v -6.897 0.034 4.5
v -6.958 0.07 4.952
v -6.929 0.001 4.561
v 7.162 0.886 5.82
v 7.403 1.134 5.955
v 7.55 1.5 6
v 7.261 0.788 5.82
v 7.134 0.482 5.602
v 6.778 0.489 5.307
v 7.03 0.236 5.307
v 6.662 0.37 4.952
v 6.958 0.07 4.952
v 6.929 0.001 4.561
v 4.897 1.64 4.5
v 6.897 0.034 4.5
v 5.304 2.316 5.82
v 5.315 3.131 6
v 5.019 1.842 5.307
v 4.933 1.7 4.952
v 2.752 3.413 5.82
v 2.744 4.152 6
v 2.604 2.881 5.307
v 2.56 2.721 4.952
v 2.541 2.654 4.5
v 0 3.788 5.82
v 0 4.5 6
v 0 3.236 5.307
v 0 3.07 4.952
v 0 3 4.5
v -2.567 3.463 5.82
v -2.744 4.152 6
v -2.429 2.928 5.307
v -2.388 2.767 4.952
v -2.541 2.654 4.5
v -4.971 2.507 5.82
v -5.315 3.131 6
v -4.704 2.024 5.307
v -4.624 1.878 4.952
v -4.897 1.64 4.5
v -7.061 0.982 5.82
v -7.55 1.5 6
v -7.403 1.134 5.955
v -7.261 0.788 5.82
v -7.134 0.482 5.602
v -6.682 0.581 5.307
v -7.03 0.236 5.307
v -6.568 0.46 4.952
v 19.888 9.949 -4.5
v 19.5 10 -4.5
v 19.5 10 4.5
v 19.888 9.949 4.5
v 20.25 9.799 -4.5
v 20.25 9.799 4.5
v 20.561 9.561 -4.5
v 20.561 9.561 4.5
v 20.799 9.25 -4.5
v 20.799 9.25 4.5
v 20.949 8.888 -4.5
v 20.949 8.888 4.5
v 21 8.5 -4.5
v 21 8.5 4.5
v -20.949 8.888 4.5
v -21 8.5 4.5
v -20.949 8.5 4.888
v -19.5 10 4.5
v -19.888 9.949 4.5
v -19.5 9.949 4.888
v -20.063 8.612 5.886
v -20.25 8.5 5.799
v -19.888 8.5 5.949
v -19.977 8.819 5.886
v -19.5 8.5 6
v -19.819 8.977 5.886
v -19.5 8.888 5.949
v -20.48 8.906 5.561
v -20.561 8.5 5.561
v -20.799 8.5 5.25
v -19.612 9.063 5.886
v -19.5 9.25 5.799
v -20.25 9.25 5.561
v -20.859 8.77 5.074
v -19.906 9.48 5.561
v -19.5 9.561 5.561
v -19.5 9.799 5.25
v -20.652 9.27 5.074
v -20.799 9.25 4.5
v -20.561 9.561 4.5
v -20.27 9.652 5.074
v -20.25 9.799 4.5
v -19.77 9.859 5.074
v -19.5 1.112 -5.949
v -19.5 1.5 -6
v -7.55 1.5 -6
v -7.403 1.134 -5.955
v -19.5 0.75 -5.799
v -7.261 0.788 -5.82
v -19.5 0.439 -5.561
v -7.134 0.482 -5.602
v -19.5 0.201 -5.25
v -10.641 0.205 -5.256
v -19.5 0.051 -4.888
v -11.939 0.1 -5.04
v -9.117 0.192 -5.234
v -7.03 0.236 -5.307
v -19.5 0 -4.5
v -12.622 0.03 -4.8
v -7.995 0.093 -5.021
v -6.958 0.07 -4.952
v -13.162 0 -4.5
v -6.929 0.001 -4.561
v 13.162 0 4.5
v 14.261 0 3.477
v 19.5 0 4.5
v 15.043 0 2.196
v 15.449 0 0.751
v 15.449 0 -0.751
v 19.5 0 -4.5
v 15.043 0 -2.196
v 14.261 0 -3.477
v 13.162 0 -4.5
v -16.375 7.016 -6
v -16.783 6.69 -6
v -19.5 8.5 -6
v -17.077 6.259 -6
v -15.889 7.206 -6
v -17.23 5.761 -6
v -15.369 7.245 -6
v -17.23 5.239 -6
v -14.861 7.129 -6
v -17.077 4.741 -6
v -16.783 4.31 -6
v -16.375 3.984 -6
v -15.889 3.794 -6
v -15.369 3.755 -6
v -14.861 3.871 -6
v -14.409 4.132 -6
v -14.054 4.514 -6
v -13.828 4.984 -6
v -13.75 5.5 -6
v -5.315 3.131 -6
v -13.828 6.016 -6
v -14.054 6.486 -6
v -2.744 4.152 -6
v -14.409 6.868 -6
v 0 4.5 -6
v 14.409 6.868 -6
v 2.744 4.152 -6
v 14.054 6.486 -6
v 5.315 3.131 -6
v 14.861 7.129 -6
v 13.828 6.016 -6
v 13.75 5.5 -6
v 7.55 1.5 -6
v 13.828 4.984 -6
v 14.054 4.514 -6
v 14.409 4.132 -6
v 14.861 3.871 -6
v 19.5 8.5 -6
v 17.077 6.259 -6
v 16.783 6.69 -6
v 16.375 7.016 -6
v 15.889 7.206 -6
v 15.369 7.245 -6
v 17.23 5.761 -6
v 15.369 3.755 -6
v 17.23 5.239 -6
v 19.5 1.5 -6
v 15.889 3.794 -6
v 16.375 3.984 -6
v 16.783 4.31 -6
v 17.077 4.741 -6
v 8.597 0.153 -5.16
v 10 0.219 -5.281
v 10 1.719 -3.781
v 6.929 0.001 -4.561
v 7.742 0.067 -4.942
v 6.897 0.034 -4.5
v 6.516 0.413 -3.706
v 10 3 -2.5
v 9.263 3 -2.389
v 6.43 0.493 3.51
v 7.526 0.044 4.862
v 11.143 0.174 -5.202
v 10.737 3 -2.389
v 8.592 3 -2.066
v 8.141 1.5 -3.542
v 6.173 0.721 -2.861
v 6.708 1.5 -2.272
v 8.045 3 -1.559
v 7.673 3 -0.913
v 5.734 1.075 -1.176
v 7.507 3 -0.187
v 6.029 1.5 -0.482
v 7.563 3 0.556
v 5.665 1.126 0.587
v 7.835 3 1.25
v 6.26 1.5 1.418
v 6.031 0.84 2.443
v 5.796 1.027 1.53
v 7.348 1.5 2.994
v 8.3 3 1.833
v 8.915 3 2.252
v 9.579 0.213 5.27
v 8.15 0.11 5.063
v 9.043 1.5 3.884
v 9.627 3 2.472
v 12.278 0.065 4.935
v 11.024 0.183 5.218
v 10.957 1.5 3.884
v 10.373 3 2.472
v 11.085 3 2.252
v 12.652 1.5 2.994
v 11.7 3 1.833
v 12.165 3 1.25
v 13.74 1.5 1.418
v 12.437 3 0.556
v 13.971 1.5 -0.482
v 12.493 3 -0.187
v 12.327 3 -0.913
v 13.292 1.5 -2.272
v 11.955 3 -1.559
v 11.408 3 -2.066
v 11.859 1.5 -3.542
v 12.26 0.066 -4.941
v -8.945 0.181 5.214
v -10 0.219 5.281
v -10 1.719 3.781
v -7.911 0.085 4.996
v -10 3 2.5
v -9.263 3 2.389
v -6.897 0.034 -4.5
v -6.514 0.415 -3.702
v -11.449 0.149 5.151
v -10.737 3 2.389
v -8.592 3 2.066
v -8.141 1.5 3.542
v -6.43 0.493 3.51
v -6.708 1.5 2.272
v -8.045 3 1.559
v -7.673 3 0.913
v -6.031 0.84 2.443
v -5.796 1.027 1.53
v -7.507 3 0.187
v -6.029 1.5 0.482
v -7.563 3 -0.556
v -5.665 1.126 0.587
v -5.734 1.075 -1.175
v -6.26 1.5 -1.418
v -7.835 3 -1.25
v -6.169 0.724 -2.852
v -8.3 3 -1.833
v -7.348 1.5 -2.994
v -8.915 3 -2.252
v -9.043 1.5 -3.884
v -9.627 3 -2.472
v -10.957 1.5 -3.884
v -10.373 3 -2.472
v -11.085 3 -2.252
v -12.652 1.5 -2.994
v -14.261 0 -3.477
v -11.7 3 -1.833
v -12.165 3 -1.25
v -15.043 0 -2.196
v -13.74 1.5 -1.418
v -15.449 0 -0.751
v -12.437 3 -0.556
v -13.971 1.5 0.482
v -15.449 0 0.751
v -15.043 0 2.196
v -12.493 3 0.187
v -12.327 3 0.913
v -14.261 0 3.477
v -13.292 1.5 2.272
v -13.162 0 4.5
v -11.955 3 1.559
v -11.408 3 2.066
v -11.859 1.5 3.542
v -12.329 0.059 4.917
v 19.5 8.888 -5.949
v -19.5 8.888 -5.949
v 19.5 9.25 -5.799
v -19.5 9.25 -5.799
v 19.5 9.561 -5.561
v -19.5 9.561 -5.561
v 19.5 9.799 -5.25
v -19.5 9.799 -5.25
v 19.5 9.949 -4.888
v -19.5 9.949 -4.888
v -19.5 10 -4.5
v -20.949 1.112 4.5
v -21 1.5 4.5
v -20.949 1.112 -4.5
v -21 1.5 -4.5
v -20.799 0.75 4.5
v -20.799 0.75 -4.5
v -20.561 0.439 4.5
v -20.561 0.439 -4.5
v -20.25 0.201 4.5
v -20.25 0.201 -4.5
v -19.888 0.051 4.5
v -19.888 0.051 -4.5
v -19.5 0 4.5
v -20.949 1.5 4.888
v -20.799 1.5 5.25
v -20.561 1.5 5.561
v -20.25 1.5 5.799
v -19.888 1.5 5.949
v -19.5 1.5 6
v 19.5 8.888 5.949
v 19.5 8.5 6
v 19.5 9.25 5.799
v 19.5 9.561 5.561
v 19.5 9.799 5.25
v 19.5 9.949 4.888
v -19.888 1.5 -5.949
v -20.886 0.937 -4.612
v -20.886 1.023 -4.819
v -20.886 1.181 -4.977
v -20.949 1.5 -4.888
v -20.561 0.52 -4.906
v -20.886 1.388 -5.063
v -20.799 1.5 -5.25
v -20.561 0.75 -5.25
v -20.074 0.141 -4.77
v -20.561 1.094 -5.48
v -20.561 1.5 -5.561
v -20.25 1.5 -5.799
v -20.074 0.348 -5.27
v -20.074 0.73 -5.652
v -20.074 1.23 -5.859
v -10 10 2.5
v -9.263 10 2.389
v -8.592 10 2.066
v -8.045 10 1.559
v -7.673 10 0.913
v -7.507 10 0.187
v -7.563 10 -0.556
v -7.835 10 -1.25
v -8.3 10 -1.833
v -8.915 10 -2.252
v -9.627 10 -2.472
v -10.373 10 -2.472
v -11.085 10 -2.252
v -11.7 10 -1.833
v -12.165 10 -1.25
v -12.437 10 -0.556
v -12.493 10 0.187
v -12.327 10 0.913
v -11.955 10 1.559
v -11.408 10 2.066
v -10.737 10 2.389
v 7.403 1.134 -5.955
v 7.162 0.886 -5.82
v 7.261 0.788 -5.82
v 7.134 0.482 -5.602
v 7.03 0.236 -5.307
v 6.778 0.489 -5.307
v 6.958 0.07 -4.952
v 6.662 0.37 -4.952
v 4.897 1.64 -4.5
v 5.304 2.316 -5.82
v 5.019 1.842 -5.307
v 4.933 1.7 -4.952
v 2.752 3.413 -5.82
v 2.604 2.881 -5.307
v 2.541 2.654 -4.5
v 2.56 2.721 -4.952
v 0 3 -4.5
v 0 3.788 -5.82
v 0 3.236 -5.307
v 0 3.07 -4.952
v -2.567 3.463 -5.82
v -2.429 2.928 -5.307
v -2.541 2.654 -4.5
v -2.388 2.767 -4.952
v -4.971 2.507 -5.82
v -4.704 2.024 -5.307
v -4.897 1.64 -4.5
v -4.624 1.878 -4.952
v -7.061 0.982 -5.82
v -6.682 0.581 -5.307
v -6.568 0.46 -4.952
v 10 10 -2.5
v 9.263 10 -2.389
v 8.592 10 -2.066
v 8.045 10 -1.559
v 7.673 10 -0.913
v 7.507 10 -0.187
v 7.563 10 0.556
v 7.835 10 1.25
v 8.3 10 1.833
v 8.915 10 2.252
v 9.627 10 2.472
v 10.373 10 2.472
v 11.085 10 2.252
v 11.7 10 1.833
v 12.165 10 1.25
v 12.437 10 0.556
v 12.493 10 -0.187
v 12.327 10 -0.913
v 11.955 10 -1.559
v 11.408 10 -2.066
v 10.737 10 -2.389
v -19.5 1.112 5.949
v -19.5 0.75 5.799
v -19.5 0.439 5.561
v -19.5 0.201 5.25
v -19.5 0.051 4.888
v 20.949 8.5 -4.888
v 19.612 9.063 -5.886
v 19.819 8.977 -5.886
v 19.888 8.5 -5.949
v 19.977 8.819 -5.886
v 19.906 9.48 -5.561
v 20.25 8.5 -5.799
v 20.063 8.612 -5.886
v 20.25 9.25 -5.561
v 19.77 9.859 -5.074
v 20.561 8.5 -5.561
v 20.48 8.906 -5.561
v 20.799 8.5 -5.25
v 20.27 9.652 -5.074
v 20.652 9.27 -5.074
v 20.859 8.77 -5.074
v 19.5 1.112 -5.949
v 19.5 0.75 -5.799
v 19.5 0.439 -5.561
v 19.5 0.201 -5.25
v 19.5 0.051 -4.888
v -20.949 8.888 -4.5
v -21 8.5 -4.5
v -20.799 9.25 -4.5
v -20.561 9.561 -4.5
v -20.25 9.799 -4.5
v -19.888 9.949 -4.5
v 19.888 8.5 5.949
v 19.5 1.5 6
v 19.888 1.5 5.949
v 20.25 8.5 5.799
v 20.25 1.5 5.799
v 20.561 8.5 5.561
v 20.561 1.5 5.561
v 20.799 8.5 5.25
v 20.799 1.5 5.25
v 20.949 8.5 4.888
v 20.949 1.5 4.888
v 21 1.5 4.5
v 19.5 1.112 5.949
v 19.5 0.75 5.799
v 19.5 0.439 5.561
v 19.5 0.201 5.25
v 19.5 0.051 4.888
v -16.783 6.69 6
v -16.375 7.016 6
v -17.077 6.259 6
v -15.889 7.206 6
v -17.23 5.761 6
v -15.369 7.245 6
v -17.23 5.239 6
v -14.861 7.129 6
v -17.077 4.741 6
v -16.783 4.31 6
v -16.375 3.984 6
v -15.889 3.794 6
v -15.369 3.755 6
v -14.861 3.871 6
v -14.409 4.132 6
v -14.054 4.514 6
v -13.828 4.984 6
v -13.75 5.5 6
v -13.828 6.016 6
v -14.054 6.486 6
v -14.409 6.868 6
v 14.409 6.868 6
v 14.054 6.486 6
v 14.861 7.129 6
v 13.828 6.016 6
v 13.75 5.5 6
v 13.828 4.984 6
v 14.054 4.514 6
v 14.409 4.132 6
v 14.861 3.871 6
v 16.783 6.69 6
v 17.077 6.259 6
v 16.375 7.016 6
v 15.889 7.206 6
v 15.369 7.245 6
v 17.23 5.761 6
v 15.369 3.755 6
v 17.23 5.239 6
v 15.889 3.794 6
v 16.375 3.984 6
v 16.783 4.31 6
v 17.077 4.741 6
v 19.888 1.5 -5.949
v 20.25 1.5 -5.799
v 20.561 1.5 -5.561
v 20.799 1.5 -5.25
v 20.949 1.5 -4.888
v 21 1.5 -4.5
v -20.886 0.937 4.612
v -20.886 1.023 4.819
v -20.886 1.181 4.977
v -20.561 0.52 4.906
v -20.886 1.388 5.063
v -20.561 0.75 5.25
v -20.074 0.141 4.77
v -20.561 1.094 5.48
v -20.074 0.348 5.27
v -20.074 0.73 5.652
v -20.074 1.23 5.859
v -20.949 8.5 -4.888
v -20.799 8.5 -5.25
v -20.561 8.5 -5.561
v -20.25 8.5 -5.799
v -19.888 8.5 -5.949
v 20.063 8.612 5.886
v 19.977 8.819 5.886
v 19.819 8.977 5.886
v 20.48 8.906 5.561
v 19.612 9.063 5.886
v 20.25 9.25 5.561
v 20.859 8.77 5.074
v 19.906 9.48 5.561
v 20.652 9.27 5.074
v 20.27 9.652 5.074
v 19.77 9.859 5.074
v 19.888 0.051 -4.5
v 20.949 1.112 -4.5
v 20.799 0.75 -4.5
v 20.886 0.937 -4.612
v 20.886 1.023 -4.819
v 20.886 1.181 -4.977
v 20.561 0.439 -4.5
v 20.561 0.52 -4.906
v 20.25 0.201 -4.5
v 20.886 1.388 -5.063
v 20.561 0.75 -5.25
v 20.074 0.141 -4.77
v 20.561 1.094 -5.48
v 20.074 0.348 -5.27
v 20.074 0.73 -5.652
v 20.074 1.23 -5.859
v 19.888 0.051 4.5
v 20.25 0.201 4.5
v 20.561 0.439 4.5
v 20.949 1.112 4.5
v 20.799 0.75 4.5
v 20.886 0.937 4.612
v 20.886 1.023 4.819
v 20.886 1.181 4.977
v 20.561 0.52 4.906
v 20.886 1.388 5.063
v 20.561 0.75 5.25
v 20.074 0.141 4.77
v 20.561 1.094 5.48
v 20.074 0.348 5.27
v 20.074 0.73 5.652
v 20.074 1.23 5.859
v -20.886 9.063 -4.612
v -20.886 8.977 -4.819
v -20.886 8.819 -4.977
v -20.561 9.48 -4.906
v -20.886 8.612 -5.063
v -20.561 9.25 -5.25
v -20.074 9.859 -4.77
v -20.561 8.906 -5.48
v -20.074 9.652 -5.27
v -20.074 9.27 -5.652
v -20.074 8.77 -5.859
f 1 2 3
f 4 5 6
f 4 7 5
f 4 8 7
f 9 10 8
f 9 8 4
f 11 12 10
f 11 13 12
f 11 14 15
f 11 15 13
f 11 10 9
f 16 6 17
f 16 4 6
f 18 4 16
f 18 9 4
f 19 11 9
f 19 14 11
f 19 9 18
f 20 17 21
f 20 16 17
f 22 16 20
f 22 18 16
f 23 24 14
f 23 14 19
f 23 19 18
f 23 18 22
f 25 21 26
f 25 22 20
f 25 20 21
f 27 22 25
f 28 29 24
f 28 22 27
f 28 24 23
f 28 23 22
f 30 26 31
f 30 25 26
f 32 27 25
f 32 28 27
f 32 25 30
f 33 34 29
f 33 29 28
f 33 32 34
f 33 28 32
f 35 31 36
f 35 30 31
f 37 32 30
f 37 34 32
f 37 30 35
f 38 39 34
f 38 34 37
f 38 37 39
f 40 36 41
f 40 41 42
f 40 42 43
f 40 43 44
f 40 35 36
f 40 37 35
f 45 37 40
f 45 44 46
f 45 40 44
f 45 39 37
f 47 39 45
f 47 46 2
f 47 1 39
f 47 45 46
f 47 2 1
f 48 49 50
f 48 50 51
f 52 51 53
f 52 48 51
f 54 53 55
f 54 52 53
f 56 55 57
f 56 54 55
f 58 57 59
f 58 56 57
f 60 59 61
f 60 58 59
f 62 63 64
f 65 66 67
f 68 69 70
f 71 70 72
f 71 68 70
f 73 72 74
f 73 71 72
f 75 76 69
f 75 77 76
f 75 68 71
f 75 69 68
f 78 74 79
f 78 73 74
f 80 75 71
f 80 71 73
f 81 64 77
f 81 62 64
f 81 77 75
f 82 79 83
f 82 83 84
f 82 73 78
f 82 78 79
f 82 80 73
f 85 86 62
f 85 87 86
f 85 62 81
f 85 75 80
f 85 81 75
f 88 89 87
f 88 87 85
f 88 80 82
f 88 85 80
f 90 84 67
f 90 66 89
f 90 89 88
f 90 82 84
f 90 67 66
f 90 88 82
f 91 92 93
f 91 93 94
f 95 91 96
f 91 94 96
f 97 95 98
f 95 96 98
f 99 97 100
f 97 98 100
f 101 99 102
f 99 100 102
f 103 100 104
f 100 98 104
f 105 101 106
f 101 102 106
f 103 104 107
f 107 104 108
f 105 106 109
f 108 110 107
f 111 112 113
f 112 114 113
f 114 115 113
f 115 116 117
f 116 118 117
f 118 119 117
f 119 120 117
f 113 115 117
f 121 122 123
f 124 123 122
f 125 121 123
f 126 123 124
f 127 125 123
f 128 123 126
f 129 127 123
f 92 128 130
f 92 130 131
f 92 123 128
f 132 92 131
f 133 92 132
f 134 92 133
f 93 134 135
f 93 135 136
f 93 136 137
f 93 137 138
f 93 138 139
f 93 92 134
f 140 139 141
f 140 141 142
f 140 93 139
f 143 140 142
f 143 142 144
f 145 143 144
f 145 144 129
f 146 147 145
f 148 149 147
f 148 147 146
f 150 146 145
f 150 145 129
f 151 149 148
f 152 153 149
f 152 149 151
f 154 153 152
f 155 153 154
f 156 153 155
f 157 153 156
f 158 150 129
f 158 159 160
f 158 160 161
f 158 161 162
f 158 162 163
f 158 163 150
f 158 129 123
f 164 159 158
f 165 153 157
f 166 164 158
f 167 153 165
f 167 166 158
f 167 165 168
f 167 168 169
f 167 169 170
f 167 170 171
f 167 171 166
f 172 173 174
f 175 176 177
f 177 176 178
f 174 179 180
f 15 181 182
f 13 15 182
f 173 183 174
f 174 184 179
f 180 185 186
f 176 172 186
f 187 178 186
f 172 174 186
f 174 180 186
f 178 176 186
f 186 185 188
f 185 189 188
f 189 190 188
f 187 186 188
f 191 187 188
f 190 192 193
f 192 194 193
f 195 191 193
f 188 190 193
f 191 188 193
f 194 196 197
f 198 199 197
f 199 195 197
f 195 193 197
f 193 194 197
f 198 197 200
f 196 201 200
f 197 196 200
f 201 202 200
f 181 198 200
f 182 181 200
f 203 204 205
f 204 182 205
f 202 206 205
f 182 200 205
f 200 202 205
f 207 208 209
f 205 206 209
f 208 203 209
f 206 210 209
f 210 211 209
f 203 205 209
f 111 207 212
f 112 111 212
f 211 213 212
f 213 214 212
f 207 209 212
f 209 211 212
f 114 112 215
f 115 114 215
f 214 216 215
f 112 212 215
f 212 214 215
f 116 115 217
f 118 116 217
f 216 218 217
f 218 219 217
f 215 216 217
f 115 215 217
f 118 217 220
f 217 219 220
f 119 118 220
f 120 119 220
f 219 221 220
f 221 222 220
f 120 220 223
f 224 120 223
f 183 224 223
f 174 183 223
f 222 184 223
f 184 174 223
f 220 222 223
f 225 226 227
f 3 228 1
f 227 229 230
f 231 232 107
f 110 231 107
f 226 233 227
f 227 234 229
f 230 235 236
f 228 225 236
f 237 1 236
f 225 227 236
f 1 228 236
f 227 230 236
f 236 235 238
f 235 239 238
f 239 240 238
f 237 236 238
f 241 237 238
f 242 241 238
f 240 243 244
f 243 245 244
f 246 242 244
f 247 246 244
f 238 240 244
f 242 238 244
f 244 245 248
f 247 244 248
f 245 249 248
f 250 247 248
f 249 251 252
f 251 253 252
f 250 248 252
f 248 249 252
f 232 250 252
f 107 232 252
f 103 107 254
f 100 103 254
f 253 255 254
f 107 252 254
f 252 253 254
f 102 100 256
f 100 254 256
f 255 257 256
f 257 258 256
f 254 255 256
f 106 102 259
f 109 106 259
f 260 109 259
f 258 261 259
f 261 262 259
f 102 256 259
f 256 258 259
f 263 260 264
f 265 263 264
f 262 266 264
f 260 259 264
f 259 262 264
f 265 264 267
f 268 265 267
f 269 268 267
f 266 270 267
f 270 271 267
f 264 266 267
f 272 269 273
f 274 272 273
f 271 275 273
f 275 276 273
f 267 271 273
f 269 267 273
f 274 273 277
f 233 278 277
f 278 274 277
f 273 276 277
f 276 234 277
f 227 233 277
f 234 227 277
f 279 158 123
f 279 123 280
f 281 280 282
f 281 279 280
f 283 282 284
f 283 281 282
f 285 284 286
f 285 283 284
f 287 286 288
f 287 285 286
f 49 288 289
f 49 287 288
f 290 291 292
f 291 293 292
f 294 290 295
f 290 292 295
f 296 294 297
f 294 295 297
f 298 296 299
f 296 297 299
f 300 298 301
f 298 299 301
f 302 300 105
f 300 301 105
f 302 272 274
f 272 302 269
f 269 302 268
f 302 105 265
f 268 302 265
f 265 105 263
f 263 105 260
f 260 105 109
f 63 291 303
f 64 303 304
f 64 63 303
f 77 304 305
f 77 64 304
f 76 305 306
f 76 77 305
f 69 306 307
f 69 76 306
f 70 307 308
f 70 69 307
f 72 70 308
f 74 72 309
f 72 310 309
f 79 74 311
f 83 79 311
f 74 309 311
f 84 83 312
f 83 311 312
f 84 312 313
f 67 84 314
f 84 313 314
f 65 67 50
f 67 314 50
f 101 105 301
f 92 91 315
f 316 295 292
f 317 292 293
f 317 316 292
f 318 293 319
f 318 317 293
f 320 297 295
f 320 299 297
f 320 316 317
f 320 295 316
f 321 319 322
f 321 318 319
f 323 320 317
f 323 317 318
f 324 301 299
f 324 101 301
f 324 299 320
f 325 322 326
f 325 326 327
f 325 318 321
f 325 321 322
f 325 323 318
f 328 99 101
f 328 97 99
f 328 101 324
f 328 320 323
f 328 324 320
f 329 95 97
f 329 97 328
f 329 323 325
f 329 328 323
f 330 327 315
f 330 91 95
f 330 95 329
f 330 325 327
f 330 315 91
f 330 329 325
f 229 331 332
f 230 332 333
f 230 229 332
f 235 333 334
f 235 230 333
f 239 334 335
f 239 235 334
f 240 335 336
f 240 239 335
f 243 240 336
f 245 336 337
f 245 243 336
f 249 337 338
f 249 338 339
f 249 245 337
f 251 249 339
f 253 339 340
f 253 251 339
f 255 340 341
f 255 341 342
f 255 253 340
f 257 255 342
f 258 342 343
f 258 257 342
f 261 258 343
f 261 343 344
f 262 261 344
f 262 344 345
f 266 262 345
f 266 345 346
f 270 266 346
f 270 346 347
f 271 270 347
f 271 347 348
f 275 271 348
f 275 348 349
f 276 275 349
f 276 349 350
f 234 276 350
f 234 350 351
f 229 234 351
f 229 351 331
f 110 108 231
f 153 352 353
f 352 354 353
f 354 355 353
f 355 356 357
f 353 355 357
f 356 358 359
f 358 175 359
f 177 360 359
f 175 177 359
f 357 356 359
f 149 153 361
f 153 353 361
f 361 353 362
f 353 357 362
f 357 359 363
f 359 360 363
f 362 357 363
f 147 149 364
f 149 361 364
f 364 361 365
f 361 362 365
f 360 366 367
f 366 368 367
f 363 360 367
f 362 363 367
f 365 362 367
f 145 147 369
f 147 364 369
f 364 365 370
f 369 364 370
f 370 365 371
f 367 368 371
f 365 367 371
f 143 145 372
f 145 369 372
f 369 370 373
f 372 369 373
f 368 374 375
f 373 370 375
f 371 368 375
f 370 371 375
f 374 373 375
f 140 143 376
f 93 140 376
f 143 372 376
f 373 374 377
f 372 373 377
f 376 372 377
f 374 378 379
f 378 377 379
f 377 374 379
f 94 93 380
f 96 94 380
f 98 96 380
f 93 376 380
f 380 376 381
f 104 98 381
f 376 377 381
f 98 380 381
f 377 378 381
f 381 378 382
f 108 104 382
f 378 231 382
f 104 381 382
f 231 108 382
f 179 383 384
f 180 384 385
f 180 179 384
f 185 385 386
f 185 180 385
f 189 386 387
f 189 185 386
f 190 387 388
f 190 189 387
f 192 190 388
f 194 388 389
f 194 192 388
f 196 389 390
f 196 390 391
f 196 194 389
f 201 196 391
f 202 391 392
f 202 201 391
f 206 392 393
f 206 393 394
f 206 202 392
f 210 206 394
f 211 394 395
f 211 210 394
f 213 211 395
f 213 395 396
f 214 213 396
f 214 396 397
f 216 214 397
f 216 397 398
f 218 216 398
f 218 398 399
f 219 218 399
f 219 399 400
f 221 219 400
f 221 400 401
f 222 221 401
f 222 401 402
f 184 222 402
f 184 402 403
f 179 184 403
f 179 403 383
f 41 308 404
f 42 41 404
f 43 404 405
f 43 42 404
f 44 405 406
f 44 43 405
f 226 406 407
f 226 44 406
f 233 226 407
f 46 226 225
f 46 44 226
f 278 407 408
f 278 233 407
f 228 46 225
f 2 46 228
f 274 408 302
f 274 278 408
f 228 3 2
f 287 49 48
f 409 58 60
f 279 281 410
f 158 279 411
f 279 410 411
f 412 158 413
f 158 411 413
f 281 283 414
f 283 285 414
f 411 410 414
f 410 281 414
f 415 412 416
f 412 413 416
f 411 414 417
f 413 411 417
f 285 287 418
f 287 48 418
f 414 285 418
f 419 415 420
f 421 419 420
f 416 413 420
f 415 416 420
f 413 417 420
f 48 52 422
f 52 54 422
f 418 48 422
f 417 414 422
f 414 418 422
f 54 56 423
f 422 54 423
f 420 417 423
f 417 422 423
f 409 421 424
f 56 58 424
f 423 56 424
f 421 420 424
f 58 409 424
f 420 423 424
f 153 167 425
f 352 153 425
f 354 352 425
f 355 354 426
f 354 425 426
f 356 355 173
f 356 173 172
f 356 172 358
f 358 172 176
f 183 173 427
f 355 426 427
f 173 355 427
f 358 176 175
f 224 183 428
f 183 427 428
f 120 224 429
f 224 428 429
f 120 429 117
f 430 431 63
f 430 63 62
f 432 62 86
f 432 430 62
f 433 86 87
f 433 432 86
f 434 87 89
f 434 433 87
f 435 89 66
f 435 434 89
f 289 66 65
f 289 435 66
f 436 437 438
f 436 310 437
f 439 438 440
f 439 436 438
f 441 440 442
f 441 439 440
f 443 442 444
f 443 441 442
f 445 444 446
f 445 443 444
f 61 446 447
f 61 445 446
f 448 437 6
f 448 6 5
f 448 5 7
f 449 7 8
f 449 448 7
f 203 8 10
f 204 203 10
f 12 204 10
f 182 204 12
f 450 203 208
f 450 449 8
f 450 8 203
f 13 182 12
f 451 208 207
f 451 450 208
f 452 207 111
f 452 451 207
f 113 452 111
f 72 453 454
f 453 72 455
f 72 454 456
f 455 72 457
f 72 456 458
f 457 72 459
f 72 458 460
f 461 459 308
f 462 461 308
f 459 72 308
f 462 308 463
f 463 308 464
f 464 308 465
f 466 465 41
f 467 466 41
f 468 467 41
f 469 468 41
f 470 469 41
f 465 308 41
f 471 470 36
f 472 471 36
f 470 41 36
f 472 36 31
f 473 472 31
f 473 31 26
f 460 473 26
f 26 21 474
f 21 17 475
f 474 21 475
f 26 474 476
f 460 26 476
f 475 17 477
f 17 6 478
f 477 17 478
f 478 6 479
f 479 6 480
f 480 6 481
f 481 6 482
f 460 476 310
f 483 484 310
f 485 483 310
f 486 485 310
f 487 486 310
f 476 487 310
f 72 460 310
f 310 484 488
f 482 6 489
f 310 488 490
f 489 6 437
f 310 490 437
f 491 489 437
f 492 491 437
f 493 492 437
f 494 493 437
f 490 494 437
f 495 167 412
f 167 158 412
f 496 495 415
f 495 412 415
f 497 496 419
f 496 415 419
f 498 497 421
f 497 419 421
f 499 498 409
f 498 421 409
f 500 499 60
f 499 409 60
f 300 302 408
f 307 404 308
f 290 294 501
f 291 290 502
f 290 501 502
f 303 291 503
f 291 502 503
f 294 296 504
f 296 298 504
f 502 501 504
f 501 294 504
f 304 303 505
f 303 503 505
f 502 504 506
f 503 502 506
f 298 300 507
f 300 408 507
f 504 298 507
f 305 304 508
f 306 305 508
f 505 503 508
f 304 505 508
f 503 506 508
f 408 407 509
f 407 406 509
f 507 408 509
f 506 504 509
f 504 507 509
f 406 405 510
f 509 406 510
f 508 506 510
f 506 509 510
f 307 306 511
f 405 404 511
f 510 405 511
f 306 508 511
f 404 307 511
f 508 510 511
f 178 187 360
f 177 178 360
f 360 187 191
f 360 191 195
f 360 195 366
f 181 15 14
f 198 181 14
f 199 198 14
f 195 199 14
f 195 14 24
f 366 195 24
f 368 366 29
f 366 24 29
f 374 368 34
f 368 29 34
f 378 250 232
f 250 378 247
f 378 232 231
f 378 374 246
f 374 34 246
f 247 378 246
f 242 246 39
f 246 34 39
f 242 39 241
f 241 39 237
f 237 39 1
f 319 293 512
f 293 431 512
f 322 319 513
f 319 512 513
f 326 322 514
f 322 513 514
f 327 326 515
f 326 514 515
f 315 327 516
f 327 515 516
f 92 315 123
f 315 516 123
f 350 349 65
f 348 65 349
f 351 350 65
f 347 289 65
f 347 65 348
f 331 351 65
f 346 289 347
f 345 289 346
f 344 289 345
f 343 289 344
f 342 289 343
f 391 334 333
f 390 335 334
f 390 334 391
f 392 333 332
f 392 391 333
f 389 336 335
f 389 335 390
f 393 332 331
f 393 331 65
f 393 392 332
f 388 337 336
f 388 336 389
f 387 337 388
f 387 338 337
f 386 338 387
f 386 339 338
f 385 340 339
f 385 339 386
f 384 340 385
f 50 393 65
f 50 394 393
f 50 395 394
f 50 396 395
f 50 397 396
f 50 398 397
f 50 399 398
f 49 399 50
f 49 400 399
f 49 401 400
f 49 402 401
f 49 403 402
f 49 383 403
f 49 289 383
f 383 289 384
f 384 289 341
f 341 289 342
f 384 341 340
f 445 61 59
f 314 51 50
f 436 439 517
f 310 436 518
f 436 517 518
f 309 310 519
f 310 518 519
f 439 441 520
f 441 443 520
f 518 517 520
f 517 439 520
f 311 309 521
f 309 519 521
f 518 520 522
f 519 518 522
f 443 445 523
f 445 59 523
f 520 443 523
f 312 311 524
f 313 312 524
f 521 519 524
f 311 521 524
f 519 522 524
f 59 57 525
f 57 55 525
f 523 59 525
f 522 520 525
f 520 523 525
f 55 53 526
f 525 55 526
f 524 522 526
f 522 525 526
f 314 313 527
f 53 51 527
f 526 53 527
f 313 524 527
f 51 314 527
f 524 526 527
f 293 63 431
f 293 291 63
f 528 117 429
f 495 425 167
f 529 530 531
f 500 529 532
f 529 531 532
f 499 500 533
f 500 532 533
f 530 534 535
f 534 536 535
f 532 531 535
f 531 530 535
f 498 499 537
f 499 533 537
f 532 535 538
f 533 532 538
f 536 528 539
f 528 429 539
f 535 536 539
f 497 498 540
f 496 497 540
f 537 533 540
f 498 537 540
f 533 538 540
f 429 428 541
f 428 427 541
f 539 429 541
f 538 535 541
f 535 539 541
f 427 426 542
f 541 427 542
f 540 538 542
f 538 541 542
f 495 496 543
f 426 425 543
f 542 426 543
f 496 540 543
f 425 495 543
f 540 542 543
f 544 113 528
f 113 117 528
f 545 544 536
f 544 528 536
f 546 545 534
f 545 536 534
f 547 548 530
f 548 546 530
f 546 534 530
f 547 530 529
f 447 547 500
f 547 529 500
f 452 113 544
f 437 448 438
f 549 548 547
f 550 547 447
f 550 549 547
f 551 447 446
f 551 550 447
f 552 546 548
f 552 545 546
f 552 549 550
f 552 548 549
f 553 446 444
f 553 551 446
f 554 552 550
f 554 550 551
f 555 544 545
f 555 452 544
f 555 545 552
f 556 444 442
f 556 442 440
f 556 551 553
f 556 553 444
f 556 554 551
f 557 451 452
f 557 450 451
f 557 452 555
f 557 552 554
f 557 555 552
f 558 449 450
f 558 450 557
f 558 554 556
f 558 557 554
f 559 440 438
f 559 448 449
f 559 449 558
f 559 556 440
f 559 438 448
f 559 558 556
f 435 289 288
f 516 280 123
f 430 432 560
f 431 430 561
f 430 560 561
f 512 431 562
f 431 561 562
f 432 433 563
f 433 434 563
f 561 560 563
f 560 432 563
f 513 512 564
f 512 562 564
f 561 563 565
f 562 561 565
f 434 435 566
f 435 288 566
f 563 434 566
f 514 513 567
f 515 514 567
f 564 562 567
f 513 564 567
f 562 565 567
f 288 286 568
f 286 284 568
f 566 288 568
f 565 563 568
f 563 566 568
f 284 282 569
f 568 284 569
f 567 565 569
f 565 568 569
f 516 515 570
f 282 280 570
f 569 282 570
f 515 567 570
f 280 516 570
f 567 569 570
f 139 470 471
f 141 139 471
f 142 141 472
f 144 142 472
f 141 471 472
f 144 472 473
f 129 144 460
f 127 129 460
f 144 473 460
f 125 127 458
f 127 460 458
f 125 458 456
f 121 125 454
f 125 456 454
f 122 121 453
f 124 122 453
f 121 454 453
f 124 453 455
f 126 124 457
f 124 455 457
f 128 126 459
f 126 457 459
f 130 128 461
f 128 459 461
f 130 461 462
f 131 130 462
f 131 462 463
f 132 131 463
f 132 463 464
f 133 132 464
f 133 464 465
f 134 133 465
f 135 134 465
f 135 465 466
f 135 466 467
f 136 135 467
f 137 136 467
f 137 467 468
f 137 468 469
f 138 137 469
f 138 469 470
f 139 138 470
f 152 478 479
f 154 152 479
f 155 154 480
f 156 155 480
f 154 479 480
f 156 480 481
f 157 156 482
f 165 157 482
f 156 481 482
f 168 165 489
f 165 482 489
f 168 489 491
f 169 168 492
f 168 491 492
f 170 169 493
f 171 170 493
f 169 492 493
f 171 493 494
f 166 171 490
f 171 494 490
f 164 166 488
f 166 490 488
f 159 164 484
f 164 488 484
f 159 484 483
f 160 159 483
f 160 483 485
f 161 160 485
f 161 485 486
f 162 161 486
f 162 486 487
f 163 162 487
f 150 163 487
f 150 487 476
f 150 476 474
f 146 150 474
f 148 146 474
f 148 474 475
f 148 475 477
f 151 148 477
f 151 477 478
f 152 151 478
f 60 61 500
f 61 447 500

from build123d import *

# Parameters (mm, degrees)
SKETCH1_W        = 42
SKETCH1_H        = 12
SKETCH1_R        = 2.5
MAIN_BOSS_DEPTH  = 10
SKETCH2_R        = 1.75
SKETCH2_R_2      = 9.5
SIDE_HOLES_DEPTH = 27.172504657
FILLET2_R        = 1.5
CHAMFER2_SIZE    = 3


with BuildPart() as part:
    # Sketch1 → main boss (new body)
    with BuildSketch(Plane(origin=(0, 0, 0), x_dir=(1, 0, 0), z_dir=(0, 1, 0))):
        Rectangle(SKETCH1_W, SKETCH1_H)
        with Locations(Location((-10, 0, 0), (0, 0, 270))):
            Circle(SKETCH1_R, mode=Mode.SUBTRACT)
        with Locations(Location((10, 0, 0), (0, 0, 90))):
            Circle(SKETCH1_R, mode=Mode.SUBTRACT)
    extrude(amount=MAIN_BOSS_DEPTH)

    # Sketch2 → side holes (cut, through all)
    with BuildSketch(Plane.XY.offset(6)):
        with Locations((-15.5, 5.5)):
            Circle(SKETCH2_R)
        with Locations(Location((15.5, 5.5, 0), (0, 0, 180))):
            Circle(SKETCH2_R)
        with Locations((0, -6.5)):
            Circle(SKETCH2_R_2)
    extrude(amount=-SIDE_HOLES_DEPTH, mode=Mode.SUBTRACT)

    # Fillet2
    fillet2_edges = [part.edges().sort_by_distance(p)[0] for p in [
        (21, 10, 0),
        (0, 10, -6),
        (-13.964101615, 0, -6),
        (13.964101615, 0, 6),
        (0, 3, -6),
        (0, 3, 6),
        (-21, 10, 0),
        (13.964101615, 0, -6),
        (21, 0, 0),
        (-13.964101615, 0, 6),
        (-21, 0, 0),
        (-21, 5, -6),
        (21, 5, -6),
        (21, 5, 6),
        (-21, 5, 6),
        (0, 10, 6),
    ]]
    fillet(fillet2_edges, radius=FILLET2_R)

    # Chamfer2
    # the kernel refuses this chamfer: 3 mm, written as the material it takes off along each edge
    with BuildSketch(Plane(origin=(-10, 0, 0), x_dir=(0, 0, 1), z_dir=(-1, 0, 0))) as chamfer2_piece_1:
        Polygon((2.5 + CHAMFER2_SIZE, 0), (2.5, CHAMFER2_SIZE), (2.5, 0), align=None)
    revolve(axis=Axis((-10, 0, 0), (0, 1, 0)), mode=Mode.SUBTRACT)
    with BuildSketch(Plane(origin=(10, 0, 0), x_dir=(0, 0, -1), z_dir=(1, 0, 0))) as chamfer2_piece_2:
        Polygon((2.5 + CHAMFER2_SIZE, 0), (2.5, CHAMFER2_SIZE), (2.5, 0), align=None)
    revolve(axis=Axis((10, 0, 0), (0, 1, 0)), mode=Mode.SUBTRACT)


solid = part.part
